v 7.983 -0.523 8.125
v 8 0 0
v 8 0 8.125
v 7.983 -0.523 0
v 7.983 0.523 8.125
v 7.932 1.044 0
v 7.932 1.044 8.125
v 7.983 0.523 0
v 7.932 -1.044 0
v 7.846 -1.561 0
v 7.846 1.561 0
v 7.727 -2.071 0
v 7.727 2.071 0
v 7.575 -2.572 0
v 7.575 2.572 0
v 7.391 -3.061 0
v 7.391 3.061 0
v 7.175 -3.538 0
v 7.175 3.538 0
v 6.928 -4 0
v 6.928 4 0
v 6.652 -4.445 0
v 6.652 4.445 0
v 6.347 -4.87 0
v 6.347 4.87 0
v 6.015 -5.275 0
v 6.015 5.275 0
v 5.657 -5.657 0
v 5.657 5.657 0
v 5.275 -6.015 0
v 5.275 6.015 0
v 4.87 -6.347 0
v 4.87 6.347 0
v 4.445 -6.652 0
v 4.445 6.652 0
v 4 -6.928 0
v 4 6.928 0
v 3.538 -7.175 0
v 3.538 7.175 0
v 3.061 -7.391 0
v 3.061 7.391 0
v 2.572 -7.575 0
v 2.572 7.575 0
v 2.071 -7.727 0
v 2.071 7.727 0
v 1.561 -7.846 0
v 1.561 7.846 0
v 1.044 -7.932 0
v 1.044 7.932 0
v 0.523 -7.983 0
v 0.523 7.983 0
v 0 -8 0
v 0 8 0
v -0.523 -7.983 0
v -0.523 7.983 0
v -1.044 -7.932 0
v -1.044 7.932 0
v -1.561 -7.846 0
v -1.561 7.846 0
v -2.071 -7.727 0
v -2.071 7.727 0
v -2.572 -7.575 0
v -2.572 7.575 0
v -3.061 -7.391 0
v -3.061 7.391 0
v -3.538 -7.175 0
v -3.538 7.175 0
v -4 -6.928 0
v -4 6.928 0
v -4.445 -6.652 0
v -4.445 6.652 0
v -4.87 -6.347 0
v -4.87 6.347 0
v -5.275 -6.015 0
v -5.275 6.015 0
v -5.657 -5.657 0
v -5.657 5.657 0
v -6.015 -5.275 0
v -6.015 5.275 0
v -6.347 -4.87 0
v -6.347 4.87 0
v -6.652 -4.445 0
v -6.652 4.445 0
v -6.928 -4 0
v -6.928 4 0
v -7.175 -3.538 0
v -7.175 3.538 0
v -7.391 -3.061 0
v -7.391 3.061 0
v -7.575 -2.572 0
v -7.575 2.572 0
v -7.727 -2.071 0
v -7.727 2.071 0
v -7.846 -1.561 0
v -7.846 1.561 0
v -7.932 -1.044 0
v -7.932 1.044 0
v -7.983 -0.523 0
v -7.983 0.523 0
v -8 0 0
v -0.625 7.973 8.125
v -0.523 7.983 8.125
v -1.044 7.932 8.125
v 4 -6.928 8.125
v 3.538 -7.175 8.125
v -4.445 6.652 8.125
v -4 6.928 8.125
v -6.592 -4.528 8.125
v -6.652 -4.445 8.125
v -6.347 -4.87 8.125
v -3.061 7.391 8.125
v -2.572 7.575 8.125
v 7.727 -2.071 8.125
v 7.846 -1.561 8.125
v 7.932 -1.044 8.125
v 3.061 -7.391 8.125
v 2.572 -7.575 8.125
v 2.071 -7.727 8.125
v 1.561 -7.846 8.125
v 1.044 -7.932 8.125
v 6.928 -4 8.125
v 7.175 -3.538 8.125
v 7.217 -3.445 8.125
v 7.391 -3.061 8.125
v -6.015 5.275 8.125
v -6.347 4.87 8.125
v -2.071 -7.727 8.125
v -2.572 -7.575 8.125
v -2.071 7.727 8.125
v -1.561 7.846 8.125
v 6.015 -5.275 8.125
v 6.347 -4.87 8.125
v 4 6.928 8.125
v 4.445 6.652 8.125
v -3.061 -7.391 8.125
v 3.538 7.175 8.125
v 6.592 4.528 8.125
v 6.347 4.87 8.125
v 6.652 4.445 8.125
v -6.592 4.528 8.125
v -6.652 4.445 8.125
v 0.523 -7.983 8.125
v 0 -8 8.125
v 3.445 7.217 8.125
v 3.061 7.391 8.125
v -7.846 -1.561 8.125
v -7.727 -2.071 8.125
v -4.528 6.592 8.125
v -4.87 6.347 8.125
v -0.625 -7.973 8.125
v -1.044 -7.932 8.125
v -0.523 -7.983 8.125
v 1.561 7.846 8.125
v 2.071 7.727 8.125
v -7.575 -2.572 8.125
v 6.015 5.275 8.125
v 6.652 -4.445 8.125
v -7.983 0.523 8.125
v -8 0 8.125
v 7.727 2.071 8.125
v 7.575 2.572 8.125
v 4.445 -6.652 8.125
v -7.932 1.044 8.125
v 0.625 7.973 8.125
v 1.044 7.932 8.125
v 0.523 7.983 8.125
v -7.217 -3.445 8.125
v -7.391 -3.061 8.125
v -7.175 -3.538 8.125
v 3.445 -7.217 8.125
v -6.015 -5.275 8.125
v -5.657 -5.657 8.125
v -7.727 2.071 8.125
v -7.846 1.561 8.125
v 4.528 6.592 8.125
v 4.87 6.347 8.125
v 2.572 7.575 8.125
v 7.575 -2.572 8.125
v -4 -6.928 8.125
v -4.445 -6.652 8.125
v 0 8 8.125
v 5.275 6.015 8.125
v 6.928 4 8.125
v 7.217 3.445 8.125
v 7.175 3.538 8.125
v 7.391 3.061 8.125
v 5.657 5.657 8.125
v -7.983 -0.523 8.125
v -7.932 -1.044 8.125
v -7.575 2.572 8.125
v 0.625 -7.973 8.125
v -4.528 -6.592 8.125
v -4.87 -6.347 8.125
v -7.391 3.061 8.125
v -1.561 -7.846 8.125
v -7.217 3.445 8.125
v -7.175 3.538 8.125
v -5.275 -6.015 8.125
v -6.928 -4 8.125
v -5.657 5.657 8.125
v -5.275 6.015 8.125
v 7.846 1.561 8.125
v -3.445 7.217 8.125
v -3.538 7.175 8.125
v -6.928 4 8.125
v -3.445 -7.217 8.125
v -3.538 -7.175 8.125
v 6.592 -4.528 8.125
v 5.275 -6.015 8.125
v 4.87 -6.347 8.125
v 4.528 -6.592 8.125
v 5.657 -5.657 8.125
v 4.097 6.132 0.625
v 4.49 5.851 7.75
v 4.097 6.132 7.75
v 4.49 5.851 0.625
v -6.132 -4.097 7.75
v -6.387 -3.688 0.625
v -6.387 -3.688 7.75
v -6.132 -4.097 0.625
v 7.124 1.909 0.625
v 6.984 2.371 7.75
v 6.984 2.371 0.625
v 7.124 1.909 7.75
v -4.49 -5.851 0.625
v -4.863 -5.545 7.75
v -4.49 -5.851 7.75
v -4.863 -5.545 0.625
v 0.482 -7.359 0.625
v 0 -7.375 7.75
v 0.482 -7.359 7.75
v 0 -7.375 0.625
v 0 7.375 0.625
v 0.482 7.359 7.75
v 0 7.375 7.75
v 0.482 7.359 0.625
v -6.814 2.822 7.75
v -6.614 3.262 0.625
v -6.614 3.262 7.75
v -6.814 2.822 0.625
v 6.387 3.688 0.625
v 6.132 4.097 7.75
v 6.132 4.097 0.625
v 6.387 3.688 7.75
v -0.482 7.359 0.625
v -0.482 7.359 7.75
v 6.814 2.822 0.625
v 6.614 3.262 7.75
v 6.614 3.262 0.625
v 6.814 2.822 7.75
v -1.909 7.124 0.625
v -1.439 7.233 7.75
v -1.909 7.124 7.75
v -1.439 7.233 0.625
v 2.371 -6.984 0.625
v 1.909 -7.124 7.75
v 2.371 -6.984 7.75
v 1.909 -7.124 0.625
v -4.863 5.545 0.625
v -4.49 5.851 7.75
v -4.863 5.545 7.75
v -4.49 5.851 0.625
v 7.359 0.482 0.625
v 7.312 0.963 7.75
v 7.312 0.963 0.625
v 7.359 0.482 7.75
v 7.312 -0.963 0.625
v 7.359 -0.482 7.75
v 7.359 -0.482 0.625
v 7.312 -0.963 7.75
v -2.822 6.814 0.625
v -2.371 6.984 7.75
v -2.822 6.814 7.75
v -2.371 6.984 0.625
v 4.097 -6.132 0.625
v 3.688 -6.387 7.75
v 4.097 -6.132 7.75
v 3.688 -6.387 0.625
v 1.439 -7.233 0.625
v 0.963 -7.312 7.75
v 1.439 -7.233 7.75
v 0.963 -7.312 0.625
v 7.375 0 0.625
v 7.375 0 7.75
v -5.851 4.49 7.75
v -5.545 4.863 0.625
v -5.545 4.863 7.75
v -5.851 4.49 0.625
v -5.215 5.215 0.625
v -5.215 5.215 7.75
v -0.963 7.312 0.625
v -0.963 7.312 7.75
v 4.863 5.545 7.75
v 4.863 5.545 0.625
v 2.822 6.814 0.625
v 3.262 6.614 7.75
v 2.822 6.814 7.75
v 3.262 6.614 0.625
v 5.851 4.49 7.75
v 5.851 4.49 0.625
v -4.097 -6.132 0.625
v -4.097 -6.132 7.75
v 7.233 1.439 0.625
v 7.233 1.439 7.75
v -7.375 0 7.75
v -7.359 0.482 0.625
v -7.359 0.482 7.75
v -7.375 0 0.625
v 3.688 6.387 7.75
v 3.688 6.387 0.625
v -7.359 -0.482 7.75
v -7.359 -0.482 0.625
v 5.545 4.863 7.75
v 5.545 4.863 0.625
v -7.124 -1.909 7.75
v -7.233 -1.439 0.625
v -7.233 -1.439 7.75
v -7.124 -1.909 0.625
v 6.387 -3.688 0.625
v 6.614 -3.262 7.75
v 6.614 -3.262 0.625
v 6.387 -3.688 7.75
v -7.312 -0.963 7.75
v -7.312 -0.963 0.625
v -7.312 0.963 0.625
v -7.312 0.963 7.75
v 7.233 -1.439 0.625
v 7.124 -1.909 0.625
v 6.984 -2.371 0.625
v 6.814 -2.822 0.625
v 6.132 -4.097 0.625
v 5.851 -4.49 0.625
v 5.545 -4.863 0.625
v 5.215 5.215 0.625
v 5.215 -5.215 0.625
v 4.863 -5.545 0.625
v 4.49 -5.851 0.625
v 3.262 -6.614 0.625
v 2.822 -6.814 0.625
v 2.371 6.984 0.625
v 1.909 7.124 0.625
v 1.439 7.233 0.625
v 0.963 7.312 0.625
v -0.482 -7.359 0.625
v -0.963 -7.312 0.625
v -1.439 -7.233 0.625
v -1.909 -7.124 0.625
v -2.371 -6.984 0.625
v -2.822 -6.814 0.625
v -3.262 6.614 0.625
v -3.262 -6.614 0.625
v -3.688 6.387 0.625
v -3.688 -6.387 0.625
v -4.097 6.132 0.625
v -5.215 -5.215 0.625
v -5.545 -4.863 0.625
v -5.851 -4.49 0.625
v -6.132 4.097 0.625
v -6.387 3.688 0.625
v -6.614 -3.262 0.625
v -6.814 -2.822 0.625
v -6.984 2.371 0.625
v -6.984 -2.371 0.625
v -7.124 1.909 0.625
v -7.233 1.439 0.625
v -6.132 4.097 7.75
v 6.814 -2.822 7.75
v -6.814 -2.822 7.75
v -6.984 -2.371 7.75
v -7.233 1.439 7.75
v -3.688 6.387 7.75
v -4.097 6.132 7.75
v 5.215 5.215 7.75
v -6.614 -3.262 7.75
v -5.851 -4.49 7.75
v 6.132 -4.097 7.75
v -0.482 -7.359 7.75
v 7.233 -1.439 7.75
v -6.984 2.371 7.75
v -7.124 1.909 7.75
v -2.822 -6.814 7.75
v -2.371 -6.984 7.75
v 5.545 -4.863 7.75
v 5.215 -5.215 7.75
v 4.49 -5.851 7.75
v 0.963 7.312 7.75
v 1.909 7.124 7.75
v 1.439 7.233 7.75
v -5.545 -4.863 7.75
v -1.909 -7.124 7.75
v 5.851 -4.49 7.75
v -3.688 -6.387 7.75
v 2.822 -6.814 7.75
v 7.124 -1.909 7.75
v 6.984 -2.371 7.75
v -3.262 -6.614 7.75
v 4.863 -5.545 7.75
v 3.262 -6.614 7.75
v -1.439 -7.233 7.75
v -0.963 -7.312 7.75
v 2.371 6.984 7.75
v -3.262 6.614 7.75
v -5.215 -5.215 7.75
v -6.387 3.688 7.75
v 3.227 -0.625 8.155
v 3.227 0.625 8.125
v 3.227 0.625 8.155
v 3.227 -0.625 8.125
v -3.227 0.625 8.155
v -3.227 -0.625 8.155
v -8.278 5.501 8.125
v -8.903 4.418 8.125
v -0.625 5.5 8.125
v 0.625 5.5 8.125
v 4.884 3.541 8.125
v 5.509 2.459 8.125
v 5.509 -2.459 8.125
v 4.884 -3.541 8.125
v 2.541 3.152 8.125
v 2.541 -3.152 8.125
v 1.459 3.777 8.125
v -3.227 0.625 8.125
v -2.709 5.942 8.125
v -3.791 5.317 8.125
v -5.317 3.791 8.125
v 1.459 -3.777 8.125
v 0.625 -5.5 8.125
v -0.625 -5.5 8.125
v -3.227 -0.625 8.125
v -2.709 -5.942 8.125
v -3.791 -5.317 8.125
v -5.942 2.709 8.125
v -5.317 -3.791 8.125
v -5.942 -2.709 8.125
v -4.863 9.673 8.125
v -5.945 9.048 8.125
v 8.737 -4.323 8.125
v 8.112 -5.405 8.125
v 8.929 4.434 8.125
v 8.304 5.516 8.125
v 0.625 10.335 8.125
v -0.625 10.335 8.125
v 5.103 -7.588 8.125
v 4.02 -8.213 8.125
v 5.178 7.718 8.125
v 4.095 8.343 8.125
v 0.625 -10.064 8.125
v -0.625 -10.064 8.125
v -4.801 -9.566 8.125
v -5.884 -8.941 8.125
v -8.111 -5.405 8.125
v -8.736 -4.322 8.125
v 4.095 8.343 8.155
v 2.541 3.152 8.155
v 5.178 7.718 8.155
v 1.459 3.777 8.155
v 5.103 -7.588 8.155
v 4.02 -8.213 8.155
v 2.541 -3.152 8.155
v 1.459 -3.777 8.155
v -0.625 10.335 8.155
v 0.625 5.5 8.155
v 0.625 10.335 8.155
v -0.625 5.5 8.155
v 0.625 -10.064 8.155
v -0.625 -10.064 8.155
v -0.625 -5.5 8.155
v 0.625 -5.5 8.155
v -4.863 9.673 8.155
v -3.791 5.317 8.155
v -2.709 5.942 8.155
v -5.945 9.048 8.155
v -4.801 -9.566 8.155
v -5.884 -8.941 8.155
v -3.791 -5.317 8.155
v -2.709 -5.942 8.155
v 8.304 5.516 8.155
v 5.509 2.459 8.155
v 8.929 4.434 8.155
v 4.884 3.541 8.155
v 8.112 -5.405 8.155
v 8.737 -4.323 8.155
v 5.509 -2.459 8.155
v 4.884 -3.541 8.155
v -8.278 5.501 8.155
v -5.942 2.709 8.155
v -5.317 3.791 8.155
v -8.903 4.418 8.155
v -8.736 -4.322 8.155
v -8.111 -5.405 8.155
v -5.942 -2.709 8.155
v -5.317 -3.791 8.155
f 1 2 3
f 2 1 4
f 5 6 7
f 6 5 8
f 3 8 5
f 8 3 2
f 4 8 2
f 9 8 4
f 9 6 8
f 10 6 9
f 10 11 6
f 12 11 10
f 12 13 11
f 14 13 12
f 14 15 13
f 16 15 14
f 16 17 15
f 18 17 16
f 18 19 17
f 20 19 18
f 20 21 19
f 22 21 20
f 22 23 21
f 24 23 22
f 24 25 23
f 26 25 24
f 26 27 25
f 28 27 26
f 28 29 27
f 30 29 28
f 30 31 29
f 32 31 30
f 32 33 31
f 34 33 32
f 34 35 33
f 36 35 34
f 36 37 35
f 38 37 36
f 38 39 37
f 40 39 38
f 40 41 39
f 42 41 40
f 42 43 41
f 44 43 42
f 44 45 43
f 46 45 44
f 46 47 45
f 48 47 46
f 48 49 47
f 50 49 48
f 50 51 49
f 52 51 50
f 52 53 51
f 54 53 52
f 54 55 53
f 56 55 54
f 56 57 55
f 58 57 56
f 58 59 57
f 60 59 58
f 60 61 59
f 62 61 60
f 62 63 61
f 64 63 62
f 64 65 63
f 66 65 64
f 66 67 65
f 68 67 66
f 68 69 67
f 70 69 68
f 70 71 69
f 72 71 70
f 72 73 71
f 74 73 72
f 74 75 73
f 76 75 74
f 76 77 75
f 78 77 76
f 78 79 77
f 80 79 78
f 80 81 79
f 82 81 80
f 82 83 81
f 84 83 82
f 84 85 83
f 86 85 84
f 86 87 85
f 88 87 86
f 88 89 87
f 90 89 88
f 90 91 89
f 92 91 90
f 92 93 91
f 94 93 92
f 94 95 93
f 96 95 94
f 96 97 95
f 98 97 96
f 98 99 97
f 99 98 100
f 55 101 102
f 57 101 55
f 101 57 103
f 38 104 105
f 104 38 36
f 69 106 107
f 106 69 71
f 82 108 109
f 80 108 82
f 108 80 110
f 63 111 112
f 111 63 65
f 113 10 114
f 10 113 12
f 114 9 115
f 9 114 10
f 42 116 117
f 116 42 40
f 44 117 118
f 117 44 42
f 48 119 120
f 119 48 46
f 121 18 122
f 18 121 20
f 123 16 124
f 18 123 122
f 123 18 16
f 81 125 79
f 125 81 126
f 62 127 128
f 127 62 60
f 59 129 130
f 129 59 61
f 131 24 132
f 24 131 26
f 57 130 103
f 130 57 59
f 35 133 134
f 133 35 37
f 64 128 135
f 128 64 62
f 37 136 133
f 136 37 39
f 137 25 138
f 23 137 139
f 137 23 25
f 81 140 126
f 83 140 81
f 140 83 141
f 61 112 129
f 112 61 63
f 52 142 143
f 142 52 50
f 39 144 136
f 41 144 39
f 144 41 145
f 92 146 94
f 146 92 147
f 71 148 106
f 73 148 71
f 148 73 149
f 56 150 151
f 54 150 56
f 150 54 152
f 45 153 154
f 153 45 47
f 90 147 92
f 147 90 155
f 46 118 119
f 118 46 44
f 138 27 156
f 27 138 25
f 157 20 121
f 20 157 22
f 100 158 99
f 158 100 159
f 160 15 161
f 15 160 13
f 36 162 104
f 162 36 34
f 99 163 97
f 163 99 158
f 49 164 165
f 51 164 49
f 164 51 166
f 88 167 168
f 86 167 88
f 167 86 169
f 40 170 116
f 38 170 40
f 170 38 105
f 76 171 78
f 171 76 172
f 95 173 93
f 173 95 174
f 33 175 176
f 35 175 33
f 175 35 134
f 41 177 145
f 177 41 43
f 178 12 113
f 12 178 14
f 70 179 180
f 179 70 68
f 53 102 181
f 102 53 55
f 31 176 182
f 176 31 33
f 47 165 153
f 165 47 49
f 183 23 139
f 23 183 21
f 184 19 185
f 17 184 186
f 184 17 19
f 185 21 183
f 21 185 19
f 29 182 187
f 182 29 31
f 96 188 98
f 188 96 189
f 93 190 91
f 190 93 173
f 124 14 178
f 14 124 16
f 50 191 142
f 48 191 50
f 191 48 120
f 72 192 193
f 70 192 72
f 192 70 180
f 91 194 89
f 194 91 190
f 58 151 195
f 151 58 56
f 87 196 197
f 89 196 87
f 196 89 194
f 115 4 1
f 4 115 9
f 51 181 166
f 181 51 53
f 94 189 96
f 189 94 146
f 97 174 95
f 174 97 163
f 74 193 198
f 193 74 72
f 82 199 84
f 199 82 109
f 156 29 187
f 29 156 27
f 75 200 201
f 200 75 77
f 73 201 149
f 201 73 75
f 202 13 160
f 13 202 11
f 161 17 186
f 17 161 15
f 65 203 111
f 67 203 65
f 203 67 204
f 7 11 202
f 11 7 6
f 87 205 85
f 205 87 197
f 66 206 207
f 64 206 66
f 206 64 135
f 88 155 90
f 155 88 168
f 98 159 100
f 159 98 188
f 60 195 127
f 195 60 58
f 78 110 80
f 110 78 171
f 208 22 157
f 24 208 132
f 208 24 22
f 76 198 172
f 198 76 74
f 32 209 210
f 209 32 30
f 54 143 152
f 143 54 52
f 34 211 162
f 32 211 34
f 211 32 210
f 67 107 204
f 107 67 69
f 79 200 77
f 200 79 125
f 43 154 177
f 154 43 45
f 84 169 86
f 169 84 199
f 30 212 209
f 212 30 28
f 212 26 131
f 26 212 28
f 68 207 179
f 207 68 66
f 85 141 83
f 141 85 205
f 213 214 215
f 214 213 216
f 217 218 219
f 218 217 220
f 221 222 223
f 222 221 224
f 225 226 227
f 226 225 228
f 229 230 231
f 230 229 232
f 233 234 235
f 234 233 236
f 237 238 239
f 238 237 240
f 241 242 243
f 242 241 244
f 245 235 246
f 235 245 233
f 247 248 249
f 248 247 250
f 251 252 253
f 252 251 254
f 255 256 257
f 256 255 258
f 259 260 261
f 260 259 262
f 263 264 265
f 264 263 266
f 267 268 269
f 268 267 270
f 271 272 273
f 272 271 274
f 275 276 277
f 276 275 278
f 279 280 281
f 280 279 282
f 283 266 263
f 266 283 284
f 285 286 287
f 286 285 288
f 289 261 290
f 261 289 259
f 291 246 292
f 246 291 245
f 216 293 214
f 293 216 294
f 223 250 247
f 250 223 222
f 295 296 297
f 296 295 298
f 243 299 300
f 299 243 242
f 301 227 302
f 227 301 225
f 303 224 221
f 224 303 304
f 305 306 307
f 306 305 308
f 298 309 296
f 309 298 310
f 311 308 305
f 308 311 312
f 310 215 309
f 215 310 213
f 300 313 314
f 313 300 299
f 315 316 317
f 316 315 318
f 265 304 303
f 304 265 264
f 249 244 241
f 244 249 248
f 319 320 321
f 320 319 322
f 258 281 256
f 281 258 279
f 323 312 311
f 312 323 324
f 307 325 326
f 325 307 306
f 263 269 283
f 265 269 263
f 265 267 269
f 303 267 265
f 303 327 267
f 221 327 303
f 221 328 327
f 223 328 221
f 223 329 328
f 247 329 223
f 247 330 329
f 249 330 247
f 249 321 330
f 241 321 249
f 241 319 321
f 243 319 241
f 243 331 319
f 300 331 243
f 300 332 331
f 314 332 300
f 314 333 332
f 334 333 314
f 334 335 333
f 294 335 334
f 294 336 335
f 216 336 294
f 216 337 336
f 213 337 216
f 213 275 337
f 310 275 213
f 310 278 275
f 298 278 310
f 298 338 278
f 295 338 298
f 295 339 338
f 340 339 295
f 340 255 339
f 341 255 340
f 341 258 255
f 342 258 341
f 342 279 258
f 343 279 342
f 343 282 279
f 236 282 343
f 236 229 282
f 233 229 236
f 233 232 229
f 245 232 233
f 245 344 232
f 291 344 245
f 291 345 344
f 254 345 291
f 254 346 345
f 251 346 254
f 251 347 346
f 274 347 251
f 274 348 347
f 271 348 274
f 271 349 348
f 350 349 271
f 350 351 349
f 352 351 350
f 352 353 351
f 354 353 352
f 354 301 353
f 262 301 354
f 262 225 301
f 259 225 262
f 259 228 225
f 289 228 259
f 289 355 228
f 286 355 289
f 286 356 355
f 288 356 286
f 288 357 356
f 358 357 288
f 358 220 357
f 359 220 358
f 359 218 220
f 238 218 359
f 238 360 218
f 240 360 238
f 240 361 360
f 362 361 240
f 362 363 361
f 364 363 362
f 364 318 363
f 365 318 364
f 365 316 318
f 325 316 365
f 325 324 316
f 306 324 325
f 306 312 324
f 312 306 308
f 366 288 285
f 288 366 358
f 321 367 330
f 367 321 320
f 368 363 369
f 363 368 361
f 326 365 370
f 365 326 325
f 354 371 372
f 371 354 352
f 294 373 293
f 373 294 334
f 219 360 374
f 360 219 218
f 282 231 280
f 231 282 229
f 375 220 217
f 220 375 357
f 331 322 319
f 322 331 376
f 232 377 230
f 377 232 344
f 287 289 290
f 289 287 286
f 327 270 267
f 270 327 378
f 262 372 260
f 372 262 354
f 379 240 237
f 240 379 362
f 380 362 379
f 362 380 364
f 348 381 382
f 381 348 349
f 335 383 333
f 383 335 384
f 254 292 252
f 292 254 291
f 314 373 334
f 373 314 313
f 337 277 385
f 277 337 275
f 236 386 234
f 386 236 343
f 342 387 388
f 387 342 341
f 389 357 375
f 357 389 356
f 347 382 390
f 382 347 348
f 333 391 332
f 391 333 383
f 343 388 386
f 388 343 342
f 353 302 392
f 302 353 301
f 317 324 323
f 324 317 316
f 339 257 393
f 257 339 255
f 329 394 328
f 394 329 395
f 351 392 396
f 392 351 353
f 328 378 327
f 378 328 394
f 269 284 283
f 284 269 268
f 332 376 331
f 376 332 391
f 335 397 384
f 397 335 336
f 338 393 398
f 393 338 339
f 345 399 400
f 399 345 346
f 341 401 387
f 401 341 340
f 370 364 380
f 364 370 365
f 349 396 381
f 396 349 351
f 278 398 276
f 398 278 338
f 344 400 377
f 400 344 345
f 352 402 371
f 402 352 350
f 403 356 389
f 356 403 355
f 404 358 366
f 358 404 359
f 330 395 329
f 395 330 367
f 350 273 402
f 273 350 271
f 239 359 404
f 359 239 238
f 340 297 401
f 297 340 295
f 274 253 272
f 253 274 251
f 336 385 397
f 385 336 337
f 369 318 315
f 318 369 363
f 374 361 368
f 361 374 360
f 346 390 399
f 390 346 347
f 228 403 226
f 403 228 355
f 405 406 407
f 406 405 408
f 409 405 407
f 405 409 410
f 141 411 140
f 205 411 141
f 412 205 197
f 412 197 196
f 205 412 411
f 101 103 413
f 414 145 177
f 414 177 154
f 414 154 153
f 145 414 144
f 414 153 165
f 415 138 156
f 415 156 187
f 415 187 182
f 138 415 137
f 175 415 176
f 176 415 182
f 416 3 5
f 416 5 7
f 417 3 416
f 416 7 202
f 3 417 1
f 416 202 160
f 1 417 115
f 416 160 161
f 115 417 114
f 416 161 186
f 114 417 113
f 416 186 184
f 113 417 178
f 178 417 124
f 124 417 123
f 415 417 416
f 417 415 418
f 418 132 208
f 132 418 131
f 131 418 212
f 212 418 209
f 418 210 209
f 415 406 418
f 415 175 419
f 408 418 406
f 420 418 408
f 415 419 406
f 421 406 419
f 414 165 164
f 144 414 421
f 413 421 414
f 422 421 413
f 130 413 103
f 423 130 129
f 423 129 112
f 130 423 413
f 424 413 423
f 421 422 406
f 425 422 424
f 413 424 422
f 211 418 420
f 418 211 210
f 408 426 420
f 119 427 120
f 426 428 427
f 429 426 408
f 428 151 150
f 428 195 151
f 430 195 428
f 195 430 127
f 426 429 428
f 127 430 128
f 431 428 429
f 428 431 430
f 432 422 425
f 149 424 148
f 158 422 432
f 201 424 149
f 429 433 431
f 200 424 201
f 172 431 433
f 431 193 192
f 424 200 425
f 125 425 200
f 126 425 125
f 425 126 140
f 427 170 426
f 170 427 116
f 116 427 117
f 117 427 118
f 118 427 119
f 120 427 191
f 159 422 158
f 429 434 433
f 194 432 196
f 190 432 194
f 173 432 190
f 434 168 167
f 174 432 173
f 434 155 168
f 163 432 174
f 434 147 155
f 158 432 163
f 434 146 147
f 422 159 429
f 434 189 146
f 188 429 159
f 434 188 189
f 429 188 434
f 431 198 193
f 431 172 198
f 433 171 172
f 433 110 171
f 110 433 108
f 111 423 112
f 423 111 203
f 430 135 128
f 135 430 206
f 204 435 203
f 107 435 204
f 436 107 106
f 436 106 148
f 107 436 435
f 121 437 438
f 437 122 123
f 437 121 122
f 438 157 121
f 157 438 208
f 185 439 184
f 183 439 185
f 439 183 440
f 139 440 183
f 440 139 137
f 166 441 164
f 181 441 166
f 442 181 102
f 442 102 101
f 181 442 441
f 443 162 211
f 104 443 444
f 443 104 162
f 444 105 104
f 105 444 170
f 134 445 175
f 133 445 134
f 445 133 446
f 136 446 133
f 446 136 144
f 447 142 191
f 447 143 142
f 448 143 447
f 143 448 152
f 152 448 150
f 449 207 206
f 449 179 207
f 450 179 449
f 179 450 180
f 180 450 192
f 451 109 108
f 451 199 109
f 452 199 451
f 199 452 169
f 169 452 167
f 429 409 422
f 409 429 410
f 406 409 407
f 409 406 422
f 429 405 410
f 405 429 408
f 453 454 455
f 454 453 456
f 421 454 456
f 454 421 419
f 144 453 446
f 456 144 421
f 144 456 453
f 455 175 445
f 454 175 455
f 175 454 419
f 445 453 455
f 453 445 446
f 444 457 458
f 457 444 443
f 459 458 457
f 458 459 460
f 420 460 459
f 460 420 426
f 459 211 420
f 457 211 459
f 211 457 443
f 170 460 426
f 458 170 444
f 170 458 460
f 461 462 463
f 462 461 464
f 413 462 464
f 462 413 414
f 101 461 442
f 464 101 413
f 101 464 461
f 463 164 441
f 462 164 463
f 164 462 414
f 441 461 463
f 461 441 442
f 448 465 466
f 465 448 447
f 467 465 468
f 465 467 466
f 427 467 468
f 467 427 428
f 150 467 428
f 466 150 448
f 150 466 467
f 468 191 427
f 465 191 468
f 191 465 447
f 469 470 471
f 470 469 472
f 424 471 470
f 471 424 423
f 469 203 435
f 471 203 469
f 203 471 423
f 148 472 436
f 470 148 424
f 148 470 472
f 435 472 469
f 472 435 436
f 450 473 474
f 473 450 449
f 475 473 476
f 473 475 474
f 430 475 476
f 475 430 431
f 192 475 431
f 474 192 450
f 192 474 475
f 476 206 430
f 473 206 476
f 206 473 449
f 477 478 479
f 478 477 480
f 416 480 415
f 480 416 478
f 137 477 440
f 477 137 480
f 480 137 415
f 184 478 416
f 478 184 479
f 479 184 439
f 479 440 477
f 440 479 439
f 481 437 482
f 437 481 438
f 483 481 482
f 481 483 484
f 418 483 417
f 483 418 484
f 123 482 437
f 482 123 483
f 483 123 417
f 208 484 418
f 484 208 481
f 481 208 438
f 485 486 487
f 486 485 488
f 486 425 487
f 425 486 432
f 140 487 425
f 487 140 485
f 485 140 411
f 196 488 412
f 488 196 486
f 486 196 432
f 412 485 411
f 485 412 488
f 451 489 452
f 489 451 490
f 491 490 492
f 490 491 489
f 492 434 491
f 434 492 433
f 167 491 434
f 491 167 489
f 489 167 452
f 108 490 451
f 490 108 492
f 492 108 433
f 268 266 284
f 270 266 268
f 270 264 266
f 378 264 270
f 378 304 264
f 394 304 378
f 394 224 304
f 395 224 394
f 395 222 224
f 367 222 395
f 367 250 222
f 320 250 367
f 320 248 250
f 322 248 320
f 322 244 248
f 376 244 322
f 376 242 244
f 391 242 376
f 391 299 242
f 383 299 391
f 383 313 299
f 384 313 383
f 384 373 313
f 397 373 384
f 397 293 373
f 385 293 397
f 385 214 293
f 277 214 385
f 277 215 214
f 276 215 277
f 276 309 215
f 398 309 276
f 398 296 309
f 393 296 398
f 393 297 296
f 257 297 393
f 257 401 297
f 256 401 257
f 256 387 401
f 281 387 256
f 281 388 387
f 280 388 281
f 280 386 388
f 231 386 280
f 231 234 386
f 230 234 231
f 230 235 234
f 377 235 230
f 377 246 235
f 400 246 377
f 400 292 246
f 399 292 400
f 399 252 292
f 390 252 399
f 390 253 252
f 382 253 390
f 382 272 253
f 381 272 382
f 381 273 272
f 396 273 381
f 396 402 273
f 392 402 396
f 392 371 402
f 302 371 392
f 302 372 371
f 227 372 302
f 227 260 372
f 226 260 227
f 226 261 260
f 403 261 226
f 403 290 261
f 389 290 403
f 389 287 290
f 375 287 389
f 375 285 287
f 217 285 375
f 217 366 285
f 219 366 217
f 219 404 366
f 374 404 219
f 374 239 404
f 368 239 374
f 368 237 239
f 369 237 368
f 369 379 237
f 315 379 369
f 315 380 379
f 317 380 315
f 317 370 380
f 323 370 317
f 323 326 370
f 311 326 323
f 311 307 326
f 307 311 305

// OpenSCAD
// Wood Shell Tongue Drum parametric master — V1 Cylinder + Flat Top,
// Standard 16" envelope: shell + soundboard + tongue LAYOUT reference marks.
//
// Authority: pending_measurement. NOT fabrication authority until reviewed
// against a measured prototype (see visual-output-register.csv CAD-001 and
// cad/mcp-session-log.md). This is a planning envelope: cad/README.md
// explains CAD is deliberately deferred until Phase 1 measurements are
// folded back into the workbook.
//
// SCOPE BOUNDARY (per instrument-maker skill "hand-refined, tuning-sensitive
// regions" rule): this models the shell/soundboard ENVELOPE and the tongue
// POSITION/LENGTH layout (thin reference marks on the soundboard) from the
// design.md position grid. It does NOT model the actual slit-routing cut
// geometry (kerf path, tongue-base relief pocket, U-shaped slot) — that is
// explicitly out of scope until CNC pocketing geometry is reviewed
// (drawing-brief.md Sheet 03, cnc/README.md). The gu port is a documented
// parameter only; design.md does not give a (r, theta) position for it in
// the schedule, so it is NOT placed geometrically here (would be an invented
// dimension) — see gu_port_dia_in comment below.
//
// Dimension sources (do not edit values without updating the source record):
//   - shell OD/height/wall thickness, soundboard thickness/diameter, gu port
//     diameter: design.md §4 "Recommended first prototype" build table
//   - tongue count/lengths, radial position grid (r, theta): design.md §4
//     tongue length schedule + drawing-brief.md Sheet 03 position grid
//     ("derived estimates for the layout drawing" per drawing-brief.md —
//     SolidWorks parametric placement against shell radius will refine them)
//   - tongue width, slit kerf width: design.md §4 build table
//
// Units: inches (packet's native shop unit for this build table).

/* [Shell] */
shell_od_in         = 16.00;  // design.md §4 "Shell OD"
shell_height_in     = 8.00;   // design.md §4 "Shell height"
wall_thickness_in   = 0.625;  // design.md §4 "Wall thickness" (finished, after lathe truing)
floor_thickness_in  = wall_thickness_in; // ASSUMPTION: bottom floor equals wall thickness; not
                                          // separately specified in design.md (stave + lathe-turned
                                          // closed bowl construction — "16 staves + 1 disc = 17 pieces").

/* [Soundboard] */
soundboard_dia_in   = 16.00;  // design.md §4 "Disc diameter" (= shell OD)
soundboard_thk_in   = 0.375;  // design.md §4 "Soundboard thk"
rabbet_depth_in     = 0.25;   // design.md §4 "rabbet ¼in deep"
rabbet_width_in     = 0.375;  // design.md §4 "× ⅜in wide"

/* [Gu port — parameter only, NOT placed: no (r,theta) in design table] */
gu_port_dia_in      = 2.5;    // design.md §4 "Gu port Ø" — initial; final size set by Helmholtz tuning in shop

/* [Tongue field — A Kurd, 11 tongues, zigzag-ascending] */
tongue_width_in     = 1.25;   // design.md §4 "Tongue width"

/* [Render quality] */
$fn = 96;

// ---------------------------------------------------------------------------
// Tongue position/length schedule — drawing-brief.md Sheet 03 position grid
// [id, note, r_in, theta_deg, length_in]
// theta measured from the ding centerline per drawing-brief.md; ding itself
// has no theta (r=0, centered) so it is handled as a special case below.
// ---------------------------------------------------------------------------

tongue_schedule = [
    ["Ding", "A3", 0.0,   0,   6.454],
    ["1",    "E4", 4.0,  60,   5.273],
    ["2",    "F4", 4.0, -60,   5.123],
    ["3",    "G4", 5.5,  90,   4.835],
    ["4",    "A4", 5.5, -90,   4.564],
    ["5",    "B4", 6.5, 120,   4.308],
    ["6",    "C5", 6.5,-120,   4.185],
    ["7",    "D5", 6.0,  30,   3.950],
    ["8",    "E5", 6.0, -30,   3.728],
    ["9",    "G5", 6.5, 150,   3.419],
    ["10",   "A5", 6.5,-150,   3.227],
];

// ---------------------------------------------------------------------------
// Derived geometry
// ---------------------------------------------------------------------------

shell_or_in   = shell_od_in / 2;
shell_ir_in   = shell_or_in - wall_thickness_in;
soundboard_r_in = soundboard_dia_in / 2;

// ---------------------------------------------------------------------------
// Shell — hollow stave cylinder, closed floor (lathe-turned bowl form)
// ---------------------------------------------------------------------------

module shell() {
    difference() {
        cylinder(h = shell_height_in, r = shell_or_in);
        translate([0, 0, floor_thickness_in])
            cylinder(h = shell_height_in, r = shell_ir_in); // open cavity above the floor
    }
}

// ---------------------------------------------------------------------------
// Soundboard — flat disc, rabbet-seated on the shell rim
// ---------------------------------------------------------------------------

module soundboard() {
    translate([0, 0, shell_height_in - rabbet_depth_in])
        cylinder(h = soundboard_thk_in, r = soundboard_r_in);
}

// ---------------------------------------------------------------------------
// Tongue layout reference marks — position + length ONLY, not cut geometry.
// Rendered as thin raised bars on top of the soundboard so the layout is
// visually distinct from the (unmodeled) actual routed slit.
// ---------------------------------------------------------------------------

marker_thickness_in = 0.03; // visual reference only, not a real dimension

module tongue_marker(r_in, theta_deg, length_in) {
    // Marker's near end sits at radius r_in from center, extending outward
    // along the radial (theta) direction by length_in.
    rotate([0, 0, theta_deg])
        translate([r_in, -tongue_width_in / 2, shell_height_in - rabbet_depth_in + soundboard_thk_in])
            cube([length_in, tongue_width_in, marker_thickness_in]);
}

module tongue_field() {
    for (t = tongue_schedule) {
        note = t[0];
        r_in = t[2];
        theta_deg = t[3];
        length_in = t[4];
        if (note == "Ding") {
            // Ding is centered at the soundboard origin; drawn along theta=0.
            translate([-length_in / 2, -tongue_width_in / 2, shell_height_in - rabbet_depth_in + soundboard_thk_in])
                cube([length_in, tongue_width_in, marker_thickness_in]);
        } else {
            tongue_marker(r_in, theta_deg, length_in);
        }
    }
}

// ---------------------------------------------------------------------------
// Top-level assembly
// ---------------------------------------------------------------------------

module wood_shell_tongue_drum_master() {
    shell();
    soundboard();
    tongue_field();
}

wood_shell_tongue_drum_master();
